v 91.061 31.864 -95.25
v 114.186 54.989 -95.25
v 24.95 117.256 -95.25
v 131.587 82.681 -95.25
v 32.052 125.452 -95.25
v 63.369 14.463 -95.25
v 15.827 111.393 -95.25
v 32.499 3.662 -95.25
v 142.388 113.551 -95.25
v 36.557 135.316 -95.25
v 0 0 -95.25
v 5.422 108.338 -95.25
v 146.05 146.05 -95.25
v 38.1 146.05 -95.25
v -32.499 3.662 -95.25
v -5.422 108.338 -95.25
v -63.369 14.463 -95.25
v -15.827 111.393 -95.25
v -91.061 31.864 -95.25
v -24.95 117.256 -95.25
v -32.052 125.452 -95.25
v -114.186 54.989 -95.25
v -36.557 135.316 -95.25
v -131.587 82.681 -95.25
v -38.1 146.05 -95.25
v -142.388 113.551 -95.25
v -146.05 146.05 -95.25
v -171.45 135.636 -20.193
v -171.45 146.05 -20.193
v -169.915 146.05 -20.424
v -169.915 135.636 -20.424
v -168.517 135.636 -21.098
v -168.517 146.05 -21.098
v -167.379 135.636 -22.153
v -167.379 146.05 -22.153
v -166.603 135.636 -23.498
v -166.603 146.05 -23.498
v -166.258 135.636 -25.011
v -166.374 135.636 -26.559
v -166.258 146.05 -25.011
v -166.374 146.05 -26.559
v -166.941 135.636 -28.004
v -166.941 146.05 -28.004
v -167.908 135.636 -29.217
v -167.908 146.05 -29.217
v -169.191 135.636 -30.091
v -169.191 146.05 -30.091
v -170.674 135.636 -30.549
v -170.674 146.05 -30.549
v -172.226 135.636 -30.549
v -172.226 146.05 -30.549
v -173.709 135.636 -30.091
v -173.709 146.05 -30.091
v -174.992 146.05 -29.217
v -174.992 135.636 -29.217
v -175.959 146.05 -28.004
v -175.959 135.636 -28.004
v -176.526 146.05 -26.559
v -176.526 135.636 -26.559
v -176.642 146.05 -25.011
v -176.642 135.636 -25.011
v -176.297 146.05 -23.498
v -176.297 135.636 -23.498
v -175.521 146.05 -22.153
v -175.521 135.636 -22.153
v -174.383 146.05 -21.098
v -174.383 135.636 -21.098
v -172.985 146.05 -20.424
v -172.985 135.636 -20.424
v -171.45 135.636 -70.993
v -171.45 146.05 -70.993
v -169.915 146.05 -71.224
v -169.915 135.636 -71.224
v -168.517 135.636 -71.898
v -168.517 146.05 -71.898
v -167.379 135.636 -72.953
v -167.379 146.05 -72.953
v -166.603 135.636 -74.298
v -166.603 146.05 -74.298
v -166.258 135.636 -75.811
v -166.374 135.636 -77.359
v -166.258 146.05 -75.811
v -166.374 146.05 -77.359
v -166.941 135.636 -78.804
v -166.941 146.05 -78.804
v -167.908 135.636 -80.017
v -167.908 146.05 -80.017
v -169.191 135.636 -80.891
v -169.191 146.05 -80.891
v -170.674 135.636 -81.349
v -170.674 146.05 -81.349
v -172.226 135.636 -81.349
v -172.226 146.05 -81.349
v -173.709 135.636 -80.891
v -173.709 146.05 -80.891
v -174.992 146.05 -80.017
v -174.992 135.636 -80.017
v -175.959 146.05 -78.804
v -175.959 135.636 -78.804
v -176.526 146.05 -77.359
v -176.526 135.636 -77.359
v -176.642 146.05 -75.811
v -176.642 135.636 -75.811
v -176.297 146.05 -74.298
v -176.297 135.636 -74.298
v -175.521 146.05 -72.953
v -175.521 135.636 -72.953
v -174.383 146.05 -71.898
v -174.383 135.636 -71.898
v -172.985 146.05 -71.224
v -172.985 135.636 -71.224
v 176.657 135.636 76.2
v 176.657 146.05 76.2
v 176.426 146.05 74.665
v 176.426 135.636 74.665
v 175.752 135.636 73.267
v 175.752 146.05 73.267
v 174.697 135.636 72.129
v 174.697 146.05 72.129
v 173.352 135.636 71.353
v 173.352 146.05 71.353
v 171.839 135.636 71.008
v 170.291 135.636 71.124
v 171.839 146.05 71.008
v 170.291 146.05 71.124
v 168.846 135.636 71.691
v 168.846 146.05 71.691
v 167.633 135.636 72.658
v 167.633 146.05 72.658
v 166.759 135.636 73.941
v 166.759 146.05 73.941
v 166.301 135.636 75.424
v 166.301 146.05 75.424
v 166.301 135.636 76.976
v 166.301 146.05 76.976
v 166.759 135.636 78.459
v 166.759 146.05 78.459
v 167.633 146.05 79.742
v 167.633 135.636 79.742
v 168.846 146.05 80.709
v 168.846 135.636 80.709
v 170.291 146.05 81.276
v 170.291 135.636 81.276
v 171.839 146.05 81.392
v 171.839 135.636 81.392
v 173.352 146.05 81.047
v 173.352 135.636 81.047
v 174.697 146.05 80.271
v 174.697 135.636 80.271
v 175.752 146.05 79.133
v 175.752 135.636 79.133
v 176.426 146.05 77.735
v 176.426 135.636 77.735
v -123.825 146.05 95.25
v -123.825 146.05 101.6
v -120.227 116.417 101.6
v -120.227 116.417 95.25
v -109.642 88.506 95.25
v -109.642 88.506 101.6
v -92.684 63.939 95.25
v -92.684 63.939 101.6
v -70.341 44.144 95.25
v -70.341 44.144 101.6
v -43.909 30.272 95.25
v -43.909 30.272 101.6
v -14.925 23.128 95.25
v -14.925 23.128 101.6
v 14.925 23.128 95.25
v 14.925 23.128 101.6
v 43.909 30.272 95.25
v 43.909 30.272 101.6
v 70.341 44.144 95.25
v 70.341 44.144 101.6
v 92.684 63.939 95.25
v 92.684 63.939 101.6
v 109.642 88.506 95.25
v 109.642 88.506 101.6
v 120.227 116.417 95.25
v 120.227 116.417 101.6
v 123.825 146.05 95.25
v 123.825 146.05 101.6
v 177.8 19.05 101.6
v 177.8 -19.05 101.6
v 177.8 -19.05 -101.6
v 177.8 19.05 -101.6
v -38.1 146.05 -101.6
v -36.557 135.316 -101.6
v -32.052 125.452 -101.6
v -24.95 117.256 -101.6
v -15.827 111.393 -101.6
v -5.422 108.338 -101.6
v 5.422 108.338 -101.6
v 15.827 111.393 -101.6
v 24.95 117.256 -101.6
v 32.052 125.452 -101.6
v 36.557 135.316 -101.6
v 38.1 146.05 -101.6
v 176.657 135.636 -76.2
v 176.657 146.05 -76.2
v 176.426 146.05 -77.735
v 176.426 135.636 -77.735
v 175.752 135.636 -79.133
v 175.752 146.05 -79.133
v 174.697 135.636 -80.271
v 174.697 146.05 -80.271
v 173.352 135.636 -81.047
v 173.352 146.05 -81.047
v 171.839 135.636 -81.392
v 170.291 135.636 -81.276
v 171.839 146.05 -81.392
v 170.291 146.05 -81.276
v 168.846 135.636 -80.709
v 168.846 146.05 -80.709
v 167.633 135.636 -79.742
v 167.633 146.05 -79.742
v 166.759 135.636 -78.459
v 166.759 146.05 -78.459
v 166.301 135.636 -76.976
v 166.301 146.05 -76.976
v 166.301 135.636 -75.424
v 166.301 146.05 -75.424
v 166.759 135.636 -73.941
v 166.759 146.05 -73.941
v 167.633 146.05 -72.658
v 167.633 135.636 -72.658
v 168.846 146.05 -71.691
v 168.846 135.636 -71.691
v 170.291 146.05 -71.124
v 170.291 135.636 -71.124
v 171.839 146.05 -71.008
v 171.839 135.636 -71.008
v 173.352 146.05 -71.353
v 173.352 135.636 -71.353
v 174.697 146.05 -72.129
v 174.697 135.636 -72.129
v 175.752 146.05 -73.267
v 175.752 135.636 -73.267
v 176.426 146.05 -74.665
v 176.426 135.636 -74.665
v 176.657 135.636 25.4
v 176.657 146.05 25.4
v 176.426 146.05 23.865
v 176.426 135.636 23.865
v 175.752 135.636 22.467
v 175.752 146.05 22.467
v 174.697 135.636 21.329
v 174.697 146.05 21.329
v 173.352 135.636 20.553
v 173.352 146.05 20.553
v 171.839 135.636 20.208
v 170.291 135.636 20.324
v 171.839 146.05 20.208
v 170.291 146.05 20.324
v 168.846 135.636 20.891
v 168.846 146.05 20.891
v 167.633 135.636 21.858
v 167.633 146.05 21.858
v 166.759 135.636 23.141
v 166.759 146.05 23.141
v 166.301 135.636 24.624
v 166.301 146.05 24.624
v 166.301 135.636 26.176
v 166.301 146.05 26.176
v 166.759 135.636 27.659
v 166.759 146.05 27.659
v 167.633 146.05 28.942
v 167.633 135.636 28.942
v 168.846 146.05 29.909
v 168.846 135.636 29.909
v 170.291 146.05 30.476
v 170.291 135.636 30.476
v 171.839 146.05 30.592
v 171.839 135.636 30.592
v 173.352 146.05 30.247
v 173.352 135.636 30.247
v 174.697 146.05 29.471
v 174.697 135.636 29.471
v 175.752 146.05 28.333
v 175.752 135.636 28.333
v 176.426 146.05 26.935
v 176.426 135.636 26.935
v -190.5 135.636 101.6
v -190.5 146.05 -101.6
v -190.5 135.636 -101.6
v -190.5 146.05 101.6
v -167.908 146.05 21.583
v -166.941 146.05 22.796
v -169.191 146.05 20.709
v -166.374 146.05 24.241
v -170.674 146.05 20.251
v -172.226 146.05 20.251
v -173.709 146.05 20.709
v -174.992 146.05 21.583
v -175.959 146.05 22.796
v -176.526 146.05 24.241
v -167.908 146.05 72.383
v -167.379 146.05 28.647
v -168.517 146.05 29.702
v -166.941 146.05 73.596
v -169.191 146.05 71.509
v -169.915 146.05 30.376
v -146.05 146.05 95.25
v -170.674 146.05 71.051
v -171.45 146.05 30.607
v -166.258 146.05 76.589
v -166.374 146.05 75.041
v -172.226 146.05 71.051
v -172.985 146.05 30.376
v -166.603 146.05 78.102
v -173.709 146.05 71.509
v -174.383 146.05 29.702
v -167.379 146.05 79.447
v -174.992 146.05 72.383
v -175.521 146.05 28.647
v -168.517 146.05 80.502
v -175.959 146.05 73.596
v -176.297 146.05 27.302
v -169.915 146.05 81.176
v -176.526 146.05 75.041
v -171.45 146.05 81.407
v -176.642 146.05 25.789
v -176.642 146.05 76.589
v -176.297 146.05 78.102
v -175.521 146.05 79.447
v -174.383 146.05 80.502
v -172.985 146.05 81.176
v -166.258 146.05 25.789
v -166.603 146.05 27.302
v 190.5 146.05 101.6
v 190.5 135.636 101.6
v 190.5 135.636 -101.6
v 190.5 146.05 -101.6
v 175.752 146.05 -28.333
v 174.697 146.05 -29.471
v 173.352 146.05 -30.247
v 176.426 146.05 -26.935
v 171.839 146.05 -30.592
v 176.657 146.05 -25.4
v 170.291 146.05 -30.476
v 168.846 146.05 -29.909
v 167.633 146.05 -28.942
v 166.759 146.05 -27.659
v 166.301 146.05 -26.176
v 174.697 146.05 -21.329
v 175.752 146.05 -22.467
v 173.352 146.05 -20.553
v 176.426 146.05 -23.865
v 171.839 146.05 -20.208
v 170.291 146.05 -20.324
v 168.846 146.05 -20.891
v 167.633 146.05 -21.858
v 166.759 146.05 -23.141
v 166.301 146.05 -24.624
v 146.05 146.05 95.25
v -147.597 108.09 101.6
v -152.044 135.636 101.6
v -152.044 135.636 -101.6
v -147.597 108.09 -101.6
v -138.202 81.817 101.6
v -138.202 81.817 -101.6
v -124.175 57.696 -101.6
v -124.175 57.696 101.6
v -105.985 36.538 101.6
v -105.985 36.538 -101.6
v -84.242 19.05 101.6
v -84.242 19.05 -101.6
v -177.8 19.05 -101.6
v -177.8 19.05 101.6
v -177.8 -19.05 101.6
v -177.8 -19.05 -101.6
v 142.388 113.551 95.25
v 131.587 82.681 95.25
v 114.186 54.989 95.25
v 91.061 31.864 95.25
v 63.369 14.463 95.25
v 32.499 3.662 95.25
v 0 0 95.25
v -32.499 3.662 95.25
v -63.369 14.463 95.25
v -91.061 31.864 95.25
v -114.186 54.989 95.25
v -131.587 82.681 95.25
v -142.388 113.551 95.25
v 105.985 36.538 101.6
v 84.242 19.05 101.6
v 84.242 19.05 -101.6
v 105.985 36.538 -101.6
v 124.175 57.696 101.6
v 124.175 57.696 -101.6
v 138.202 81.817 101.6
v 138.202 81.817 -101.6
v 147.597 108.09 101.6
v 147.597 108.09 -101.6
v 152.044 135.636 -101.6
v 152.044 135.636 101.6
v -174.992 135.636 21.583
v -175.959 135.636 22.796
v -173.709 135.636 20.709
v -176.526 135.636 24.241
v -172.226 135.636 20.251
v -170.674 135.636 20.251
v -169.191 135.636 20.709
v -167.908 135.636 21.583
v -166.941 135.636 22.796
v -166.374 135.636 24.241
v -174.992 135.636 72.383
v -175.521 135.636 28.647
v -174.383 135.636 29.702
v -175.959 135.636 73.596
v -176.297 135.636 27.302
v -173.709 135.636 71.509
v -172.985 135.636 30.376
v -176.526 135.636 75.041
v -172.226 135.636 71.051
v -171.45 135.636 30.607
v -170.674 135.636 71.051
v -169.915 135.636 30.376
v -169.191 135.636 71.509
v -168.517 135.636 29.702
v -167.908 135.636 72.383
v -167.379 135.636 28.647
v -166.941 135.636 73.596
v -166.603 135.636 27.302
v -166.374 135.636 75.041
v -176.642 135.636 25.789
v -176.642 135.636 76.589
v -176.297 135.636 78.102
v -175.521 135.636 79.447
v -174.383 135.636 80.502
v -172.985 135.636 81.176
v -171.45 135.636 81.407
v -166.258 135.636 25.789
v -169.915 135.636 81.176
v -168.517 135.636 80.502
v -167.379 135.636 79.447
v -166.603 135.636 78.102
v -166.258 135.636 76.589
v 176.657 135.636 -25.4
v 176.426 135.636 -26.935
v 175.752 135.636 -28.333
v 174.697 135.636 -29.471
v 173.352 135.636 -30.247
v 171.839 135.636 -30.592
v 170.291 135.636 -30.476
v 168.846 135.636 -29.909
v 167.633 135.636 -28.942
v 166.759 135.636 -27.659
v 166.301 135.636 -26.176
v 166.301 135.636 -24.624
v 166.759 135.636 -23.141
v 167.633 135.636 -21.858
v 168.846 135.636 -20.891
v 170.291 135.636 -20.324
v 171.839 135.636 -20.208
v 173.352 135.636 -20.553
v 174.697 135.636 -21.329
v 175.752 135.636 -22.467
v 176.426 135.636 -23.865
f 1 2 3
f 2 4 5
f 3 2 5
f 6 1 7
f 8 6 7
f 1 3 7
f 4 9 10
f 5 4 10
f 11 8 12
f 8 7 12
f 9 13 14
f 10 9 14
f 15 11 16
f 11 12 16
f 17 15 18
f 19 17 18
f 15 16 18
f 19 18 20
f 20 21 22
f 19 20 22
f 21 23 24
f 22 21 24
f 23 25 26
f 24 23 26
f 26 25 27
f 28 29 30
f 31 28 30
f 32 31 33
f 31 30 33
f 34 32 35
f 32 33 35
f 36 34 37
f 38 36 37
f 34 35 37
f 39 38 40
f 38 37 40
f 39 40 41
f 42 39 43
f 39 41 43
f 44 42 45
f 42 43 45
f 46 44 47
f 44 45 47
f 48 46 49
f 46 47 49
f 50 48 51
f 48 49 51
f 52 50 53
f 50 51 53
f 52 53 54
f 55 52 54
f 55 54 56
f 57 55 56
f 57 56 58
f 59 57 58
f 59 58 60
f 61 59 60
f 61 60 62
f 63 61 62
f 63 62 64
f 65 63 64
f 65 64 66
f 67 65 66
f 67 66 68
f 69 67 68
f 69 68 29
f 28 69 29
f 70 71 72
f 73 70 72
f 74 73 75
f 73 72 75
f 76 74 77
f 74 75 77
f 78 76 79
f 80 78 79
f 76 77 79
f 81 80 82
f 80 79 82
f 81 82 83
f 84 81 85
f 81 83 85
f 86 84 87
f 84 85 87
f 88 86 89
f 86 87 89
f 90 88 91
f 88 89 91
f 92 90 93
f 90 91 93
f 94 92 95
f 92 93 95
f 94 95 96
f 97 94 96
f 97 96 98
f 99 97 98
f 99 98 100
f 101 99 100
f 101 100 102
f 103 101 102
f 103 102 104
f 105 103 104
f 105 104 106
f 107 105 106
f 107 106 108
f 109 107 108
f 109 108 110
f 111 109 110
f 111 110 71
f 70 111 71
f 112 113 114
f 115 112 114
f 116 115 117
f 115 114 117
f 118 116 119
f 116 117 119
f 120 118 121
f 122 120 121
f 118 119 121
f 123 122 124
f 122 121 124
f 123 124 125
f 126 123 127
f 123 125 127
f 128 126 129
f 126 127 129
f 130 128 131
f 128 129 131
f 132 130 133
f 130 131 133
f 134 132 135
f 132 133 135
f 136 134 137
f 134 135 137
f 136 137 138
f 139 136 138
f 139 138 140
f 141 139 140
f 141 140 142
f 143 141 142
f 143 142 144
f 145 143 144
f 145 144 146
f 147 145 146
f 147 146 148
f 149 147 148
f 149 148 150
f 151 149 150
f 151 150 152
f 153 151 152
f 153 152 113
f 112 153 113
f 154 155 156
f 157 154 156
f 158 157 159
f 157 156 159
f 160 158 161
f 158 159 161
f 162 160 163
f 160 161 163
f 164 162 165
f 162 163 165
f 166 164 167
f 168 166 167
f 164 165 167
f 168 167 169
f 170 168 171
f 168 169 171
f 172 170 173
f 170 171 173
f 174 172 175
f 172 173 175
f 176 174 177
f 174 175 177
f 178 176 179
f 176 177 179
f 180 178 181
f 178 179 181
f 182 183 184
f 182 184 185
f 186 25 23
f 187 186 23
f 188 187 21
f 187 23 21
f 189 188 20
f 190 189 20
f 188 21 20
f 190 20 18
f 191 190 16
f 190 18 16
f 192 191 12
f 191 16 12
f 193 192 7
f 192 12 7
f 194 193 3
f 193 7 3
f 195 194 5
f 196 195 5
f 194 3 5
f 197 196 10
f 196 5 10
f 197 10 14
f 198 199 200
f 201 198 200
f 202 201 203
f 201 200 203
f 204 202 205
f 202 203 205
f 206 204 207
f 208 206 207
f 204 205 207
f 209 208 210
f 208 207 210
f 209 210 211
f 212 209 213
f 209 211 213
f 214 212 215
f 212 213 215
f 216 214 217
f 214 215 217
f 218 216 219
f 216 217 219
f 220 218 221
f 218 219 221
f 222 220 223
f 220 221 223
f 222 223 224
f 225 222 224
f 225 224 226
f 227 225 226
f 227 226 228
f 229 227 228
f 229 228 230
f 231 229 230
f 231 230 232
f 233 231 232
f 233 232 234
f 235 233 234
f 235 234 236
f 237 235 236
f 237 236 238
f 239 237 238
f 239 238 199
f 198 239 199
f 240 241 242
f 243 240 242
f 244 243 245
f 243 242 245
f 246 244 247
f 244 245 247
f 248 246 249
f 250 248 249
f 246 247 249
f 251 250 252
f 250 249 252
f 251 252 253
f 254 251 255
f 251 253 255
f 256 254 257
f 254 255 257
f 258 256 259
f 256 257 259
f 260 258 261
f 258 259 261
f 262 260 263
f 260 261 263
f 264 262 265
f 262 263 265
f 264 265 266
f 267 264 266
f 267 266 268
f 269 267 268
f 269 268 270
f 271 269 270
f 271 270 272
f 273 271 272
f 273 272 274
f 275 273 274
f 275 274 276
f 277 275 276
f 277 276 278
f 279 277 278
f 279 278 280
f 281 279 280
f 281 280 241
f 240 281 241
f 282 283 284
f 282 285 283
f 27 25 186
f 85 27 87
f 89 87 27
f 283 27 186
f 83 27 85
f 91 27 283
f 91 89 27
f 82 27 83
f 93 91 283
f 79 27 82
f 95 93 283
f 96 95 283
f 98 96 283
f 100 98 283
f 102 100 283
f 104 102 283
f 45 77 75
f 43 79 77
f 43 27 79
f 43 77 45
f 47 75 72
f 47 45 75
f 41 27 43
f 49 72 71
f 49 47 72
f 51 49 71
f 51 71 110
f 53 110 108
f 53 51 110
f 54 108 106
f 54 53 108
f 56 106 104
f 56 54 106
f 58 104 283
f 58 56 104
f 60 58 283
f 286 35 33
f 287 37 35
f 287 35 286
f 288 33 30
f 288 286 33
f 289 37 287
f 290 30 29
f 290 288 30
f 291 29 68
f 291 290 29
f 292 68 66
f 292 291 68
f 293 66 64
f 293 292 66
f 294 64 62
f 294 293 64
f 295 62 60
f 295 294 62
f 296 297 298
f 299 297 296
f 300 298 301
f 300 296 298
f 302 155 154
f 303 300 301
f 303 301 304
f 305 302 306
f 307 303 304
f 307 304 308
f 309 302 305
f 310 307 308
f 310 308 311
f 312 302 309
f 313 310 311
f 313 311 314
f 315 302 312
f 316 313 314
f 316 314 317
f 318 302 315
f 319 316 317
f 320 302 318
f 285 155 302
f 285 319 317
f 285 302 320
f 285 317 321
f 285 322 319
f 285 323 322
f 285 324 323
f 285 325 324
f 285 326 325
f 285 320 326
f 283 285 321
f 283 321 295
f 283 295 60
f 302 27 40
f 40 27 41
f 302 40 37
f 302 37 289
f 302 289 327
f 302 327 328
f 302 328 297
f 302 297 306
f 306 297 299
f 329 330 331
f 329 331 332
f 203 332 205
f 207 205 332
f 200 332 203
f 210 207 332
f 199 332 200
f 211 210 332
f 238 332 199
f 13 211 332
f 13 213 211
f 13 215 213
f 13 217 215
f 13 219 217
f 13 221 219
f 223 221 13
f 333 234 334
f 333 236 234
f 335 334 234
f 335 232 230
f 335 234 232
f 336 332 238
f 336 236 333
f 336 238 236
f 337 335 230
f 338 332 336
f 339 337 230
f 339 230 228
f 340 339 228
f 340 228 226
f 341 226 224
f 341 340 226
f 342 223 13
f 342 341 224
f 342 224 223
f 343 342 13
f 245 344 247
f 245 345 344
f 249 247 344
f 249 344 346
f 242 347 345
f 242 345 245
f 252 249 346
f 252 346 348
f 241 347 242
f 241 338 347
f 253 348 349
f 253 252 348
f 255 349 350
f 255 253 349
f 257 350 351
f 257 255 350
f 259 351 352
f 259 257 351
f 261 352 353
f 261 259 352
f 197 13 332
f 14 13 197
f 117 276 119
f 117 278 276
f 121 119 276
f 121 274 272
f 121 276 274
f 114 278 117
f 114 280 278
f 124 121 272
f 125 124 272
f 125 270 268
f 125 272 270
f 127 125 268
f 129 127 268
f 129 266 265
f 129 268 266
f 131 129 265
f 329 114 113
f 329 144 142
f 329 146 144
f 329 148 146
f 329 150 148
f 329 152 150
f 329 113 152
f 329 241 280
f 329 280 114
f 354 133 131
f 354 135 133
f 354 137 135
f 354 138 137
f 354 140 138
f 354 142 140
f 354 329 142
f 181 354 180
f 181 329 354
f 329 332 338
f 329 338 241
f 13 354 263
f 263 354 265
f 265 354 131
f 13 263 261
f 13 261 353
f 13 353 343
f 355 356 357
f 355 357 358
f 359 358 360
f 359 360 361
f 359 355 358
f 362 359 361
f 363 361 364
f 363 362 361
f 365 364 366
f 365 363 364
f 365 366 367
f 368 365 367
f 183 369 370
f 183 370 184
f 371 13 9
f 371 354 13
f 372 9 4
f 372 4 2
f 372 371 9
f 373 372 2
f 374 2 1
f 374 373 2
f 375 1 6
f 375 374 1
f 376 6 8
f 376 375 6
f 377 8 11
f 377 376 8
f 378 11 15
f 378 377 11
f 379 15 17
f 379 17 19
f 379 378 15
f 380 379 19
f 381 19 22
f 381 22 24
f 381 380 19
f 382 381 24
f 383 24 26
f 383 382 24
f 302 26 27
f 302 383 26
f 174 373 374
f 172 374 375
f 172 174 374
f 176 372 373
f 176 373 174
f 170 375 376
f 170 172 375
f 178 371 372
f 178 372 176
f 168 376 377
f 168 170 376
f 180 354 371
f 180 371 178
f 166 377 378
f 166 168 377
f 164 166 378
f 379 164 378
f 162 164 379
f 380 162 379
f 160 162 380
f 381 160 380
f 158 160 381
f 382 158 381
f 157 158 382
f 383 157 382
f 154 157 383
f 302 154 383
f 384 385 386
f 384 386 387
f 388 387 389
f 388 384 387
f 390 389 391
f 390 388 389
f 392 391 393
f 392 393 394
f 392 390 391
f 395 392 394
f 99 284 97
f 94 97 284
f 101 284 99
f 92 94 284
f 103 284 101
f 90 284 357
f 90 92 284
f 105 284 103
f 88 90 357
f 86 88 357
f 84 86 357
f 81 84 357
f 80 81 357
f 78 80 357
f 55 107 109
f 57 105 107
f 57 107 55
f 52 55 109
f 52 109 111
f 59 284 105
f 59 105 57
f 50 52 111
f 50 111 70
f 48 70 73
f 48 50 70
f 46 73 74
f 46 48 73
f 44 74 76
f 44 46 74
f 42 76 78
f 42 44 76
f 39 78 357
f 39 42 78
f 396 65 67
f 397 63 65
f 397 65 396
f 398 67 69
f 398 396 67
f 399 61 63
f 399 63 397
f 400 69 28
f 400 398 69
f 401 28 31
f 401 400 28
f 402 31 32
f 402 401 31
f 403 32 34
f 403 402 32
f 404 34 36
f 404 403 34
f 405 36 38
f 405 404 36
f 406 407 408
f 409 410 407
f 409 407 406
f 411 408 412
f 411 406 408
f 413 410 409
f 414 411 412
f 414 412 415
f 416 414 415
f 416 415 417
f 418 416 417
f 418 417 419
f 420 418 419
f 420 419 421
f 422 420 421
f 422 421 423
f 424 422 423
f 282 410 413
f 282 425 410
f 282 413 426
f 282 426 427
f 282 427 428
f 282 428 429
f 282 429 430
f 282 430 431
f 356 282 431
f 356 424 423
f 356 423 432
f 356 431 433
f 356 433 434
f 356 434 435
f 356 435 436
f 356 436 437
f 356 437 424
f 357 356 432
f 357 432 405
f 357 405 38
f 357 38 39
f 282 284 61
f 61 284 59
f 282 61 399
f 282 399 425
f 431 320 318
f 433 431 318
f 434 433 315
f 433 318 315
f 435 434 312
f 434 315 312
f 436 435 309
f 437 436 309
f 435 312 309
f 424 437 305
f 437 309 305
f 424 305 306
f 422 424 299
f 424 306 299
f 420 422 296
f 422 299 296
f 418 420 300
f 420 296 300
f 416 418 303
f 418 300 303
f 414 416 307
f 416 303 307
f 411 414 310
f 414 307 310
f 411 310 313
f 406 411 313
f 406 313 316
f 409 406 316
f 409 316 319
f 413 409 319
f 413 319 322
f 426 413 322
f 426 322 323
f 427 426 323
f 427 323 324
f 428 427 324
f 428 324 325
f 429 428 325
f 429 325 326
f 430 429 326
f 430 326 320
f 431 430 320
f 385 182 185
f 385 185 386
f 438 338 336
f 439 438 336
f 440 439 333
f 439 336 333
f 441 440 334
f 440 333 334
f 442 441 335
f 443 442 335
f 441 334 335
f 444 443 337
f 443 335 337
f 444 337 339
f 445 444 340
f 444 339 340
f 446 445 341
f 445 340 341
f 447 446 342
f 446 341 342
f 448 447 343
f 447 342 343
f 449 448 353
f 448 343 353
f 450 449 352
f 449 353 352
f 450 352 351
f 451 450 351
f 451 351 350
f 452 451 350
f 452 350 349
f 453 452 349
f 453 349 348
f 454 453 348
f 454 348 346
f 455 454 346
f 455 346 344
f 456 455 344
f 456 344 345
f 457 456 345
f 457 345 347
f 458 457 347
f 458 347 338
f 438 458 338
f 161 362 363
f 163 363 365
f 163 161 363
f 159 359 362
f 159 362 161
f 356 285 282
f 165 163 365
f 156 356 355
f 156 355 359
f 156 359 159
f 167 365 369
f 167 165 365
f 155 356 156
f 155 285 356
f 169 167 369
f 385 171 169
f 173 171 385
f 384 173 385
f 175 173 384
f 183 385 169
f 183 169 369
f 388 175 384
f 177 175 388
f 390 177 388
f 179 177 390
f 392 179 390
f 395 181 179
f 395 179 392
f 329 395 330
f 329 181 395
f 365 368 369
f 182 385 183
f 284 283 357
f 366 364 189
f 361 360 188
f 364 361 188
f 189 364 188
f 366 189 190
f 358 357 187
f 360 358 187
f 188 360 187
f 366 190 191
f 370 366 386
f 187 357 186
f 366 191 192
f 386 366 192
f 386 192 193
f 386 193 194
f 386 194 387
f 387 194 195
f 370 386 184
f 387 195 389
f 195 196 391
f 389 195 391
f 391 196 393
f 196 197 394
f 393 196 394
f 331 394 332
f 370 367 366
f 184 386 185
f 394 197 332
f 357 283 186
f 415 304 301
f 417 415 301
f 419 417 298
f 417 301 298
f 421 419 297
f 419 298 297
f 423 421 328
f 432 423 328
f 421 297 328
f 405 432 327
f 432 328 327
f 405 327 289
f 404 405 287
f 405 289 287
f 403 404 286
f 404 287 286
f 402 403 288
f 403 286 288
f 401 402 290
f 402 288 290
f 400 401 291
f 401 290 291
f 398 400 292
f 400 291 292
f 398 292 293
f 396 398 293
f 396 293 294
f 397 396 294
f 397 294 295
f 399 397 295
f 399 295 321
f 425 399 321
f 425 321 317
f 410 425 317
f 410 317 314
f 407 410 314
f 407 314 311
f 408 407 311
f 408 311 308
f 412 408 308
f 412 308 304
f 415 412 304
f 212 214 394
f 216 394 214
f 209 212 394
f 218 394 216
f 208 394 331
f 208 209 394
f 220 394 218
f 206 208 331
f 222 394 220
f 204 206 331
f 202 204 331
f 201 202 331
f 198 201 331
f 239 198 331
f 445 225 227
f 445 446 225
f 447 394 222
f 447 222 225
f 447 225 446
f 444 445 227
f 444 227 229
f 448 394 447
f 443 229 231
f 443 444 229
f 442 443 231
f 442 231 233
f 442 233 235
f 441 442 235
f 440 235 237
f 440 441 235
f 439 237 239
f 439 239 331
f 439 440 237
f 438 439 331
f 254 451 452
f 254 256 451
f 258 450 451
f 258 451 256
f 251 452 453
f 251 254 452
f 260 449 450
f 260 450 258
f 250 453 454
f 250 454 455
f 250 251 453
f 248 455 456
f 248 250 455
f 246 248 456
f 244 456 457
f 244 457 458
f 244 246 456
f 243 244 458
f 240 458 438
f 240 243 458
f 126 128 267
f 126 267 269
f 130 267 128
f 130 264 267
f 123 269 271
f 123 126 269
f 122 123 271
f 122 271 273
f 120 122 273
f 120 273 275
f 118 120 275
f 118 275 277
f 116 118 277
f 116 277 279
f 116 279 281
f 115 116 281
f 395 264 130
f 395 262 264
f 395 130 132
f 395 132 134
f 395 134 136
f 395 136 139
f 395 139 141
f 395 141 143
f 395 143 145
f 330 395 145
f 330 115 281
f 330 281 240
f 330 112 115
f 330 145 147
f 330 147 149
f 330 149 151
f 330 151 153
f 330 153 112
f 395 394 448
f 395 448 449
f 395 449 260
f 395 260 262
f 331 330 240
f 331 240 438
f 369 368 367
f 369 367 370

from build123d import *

# Parameters (mm, degrees)
BOSS_EXTRUDE1_DEPTH = 101.6
CUT_EXTRUDE1_DEPTH  = 95.25
CUT_EXTRUDE2_REACH  = 316.501
SKETCH5_R           = 123.825
SKETCH6_R           = 38.1
CUT_EXTRUDE3_DEPTH  = 311.436426664
SKETCH7_R           = 5.207
CUT_EXTRUDE4_DEPTH  = 83.566


with BuildPart() as part:
    # Sketch2 → Boss-Extrude1 (new, symmetric)
    with BuildSketch(Plane.XY):
        with BuildLine():
            Line((-190.5, 135.636), (-152.043772, 135.636))
            ThreePointArc((-152.043772, 135.636), (0, -6.35), (152.043772, 135.636))
            Line((152.043772, 135.636), (190.5, 135.636))
            Line((190.5, 135.636), (190.5, 146.05))
            Line((190.5, 146.05), (152.4, 146.05))
            Line((152.4, 146.05), (-152.4, 146.05))
            Line((-152.4, 146.05), (-190.5, 146.05))
            Line((-190.5, 146.05), (-190.5, 135.636))
        make_face()
        with BuildLine():
            Line((-84.242269675, 19.05), (-177.8, 19.05))
            Line((-177.8, 19.05), (-177.8, -19.05))
            Line((-177.8, -19.05), (177.8, -19.05))
            Line((177.8, -19.05), (177.8, 19.05))
            Line((177.8, 19.05), (84.242269675, 19.05))
            ThreePointArc((84.242269675, 19.05), (0, -6.35), (-84.242269675, 19.05))
        make_face()
    extrude(amount=BOSS_EXTRUDE1_DEPTH, both=True)

    # Sketch4 → Cut-Extrude1 (cut, symmetric)
    with BuildSketch(Plane.XY):
        with BuildLine():
            Line((-146.05, 146.05), (146.05, 146.05))
            ThreePointArc((146.05, 146.05), (0, 0), (-146.05, 146.05))
        make_face()
    extrude(amount=CUT_EXTRUDE1_DEPTH, both=True, mode=Mode.SUBTRACT)

    # Sketch5 → Cut-Extrude2 (cut, up to next)
    with BuildSketch(Plane.XY.offset(101.6), mode=Mode.PRIVATE) as cut_extrude2_sk1:
        with Locations((0, 146.05)):
            Circle(SKETCH5_R)
    cut_extrude2_tool1 = extrude(cut_extrude2_sk1.sketch, amount=-CUT_EXTRUDE2_REACH, mode=Mode.PRIVATE) & part.part
    add(cut_extrude2_tool1.solids().sort_by_distance((0, 146.05, 101.6))[0], mode=Mode.SUBTRACT)

    # Sketch6 → Cut-Extrude3 (cut, through all)
    with BuildSketch(Plane.XY.offset(-95.25)):
        with Locations((0, 146.05)):
            Circle(SKETCH6_R)
    extrude(amount=-CUT_EXTRUDE3_DEPTH, mode=Mode.SUBTRACT)

    # Sketch7 → Cut-Extrude4 (cut)
    with BuildSketch(Plane(origin=(0, 146.05, 0), x_dir=(1, 0, 0), z_dir=(0, 1, 0))):
        with Locations(Location((-171.45, 76.2, 0), (0, 0, 270))):
            Circle(SKETCH7_R)
        with Locations(Location((-171.45, 25.4, 0), (0, 0, 270))):
            Circle(SKETCH7_R)
        with Locations(Location((-171.45, -25.4, 0), (0, 0, 270))):
            Circle(SKETCH7_R)
        with Locations(Location((-171.45, -76.2, 0), (0, 0, 270))):
            Circle(SKETCH7_R)
        with Locations((171.45, -76.2)):
            Circle(SKETCH7_R)
        with Locations((171.45, -25.4)):
            Circle(SKETCH7_R)
        with Locations((171.45, 25.4)):
            Circle(SKETCH7_R)
        with Locations((171.45, 76.2)):
            Circle(SKETCH7_R)
    extrude(amount=-CUT_EXTRUDE4_DEPTH, mode=Mode.SUBTRACT)


solid = part.part
